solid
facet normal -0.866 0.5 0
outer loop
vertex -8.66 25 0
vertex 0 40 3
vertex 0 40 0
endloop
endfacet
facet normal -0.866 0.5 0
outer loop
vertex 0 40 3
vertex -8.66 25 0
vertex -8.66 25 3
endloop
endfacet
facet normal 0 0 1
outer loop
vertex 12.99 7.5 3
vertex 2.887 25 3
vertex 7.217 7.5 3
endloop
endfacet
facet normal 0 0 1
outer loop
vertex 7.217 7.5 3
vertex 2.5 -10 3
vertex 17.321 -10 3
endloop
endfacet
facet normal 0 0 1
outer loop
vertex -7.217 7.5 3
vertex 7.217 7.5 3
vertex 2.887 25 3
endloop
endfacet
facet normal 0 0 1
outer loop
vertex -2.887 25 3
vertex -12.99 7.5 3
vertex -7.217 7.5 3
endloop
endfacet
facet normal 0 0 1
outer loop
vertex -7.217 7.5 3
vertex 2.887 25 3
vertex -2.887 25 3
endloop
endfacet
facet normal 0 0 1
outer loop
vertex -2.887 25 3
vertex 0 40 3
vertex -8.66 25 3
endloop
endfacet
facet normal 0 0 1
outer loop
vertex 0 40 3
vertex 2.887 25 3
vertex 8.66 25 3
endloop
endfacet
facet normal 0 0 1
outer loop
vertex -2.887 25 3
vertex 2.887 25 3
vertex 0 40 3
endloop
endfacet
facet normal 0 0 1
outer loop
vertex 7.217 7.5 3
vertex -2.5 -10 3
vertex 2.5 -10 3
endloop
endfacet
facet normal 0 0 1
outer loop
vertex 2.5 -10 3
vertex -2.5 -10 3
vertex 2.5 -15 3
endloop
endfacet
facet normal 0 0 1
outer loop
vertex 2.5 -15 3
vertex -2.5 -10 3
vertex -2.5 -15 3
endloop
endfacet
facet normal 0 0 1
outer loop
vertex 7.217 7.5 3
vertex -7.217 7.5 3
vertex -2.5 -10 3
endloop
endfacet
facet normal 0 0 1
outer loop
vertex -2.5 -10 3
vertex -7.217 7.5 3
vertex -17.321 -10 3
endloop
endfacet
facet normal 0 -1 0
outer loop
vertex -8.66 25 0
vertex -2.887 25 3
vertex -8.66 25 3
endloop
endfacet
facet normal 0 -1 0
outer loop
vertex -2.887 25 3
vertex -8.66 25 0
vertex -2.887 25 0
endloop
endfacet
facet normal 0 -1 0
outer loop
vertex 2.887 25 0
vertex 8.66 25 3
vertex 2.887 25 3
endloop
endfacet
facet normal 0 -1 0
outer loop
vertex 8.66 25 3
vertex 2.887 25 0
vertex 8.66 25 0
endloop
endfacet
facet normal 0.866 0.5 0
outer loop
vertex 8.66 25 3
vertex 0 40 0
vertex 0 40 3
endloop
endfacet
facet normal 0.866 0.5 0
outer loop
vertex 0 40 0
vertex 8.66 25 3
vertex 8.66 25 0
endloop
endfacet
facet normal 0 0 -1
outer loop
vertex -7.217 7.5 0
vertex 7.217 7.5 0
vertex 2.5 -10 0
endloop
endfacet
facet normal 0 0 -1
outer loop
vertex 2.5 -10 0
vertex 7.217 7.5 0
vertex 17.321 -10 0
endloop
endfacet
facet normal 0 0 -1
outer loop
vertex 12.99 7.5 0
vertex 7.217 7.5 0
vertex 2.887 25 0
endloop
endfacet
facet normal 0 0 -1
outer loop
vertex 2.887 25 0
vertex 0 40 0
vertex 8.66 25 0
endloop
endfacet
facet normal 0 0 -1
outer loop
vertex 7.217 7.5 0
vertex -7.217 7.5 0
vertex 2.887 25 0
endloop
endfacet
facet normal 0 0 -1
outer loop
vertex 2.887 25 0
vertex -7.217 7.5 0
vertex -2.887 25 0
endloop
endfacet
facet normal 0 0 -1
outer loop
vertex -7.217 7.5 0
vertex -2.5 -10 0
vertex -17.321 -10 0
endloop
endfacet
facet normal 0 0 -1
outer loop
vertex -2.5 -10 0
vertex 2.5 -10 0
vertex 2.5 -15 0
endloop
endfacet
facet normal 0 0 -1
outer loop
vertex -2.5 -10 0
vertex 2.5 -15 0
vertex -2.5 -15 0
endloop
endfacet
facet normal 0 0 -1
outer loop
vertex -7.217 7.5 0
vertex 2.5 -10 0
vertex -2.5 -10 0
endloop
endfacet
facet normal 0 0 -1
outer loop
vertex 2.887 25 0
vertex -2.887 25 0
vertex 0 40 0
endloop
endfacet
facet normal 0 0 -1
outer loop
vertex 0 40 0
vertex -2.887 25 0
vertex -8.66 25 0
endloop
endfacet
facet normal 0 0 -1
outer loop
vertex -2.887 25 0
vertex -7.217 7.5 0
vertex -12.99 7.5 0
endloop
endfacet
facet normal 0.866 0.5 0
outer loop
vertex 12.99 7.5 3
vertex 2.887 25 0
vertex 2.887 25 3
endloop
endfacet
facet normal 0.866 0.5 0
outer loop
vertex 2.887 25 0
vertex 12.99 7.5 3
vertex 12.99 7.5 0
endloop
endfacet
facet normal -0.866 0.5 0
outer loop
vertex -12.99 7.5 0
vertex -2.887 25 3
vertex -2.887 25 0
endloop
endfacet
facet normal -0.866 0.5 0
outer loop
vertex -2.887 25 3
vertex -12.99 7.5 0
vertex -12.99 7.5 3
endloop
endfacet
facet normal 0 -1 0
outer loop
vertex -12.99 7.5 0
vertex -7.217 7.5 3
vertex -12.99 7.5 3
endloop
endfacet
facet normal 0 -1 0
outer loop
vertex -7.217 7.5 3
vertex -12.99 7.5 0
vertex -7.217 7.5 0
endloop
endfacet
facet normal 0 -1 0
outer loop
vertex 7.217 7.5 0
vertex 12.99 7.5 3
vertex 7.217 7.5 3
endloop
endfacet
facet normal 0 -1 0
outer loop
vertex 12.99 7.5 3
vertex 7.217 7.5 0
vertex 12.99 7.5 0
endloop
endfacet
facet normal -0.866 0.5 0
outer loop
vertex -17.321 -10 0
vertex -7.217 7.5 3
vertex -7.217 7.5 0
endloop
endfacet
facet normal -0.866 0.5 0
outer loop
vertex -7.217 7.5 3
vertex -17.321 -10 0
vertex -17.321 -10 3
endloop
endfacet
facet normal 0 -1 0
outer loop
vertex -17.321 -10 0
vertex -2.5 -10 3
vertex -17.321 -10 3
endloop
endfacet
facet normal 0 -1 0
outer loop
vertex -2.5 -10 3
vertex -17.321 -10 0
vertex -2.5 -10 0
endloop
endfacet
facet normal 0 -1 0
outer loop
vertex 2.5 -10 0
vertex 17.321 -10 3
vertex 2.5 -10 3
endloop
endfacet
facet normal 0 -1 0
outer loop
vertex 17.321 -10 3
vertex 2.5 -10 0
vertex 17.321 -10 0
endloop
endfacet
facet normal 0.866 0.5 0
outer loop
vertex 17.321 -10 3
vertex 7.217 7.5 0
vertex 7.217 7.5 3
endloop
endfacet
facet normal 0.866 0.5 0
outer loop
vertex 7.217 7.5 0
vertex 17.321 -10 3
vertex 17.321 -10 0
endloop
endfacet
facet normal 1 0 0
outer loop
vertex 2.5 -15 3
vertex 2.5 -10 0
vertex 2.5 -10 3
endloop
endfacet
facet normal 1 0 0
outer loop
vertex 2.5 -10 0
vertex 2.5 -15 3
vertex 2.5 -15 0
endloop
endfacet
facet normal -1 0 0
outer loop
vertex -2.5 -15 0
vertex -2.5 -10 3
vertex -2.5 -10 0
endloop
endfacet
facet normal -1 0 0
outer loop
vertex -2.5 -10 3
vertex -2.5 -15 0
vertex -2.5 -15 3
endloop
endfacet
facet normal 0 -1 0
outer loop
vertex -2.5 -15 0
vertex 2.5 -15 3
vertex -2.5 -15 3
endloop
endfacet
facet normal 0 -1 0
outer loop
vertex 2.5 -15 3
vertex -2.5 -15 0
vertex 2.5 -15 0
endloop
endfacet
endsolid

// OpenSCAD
christmasTree();

module christmasTree(height = 3)
{
    union()
    {
        // top triangle
        translate([0, 30, 0])
        triangle(10, height);
        
        // middle triangle
        translate([0, 15, 0])
        color("green")
        triangle(15, height);
        
        // bottom triangle
        triangle(20, height);
        
        // trunk
        color("brown")
        translate([-2.5, -15, 0])
        cube([5, 5, height]);
    }
}

module triangle(size, height)
{
    rotate([0, 0, 90])
    cylinder(r=size, 
             $fn=3,
             h=height);
}
